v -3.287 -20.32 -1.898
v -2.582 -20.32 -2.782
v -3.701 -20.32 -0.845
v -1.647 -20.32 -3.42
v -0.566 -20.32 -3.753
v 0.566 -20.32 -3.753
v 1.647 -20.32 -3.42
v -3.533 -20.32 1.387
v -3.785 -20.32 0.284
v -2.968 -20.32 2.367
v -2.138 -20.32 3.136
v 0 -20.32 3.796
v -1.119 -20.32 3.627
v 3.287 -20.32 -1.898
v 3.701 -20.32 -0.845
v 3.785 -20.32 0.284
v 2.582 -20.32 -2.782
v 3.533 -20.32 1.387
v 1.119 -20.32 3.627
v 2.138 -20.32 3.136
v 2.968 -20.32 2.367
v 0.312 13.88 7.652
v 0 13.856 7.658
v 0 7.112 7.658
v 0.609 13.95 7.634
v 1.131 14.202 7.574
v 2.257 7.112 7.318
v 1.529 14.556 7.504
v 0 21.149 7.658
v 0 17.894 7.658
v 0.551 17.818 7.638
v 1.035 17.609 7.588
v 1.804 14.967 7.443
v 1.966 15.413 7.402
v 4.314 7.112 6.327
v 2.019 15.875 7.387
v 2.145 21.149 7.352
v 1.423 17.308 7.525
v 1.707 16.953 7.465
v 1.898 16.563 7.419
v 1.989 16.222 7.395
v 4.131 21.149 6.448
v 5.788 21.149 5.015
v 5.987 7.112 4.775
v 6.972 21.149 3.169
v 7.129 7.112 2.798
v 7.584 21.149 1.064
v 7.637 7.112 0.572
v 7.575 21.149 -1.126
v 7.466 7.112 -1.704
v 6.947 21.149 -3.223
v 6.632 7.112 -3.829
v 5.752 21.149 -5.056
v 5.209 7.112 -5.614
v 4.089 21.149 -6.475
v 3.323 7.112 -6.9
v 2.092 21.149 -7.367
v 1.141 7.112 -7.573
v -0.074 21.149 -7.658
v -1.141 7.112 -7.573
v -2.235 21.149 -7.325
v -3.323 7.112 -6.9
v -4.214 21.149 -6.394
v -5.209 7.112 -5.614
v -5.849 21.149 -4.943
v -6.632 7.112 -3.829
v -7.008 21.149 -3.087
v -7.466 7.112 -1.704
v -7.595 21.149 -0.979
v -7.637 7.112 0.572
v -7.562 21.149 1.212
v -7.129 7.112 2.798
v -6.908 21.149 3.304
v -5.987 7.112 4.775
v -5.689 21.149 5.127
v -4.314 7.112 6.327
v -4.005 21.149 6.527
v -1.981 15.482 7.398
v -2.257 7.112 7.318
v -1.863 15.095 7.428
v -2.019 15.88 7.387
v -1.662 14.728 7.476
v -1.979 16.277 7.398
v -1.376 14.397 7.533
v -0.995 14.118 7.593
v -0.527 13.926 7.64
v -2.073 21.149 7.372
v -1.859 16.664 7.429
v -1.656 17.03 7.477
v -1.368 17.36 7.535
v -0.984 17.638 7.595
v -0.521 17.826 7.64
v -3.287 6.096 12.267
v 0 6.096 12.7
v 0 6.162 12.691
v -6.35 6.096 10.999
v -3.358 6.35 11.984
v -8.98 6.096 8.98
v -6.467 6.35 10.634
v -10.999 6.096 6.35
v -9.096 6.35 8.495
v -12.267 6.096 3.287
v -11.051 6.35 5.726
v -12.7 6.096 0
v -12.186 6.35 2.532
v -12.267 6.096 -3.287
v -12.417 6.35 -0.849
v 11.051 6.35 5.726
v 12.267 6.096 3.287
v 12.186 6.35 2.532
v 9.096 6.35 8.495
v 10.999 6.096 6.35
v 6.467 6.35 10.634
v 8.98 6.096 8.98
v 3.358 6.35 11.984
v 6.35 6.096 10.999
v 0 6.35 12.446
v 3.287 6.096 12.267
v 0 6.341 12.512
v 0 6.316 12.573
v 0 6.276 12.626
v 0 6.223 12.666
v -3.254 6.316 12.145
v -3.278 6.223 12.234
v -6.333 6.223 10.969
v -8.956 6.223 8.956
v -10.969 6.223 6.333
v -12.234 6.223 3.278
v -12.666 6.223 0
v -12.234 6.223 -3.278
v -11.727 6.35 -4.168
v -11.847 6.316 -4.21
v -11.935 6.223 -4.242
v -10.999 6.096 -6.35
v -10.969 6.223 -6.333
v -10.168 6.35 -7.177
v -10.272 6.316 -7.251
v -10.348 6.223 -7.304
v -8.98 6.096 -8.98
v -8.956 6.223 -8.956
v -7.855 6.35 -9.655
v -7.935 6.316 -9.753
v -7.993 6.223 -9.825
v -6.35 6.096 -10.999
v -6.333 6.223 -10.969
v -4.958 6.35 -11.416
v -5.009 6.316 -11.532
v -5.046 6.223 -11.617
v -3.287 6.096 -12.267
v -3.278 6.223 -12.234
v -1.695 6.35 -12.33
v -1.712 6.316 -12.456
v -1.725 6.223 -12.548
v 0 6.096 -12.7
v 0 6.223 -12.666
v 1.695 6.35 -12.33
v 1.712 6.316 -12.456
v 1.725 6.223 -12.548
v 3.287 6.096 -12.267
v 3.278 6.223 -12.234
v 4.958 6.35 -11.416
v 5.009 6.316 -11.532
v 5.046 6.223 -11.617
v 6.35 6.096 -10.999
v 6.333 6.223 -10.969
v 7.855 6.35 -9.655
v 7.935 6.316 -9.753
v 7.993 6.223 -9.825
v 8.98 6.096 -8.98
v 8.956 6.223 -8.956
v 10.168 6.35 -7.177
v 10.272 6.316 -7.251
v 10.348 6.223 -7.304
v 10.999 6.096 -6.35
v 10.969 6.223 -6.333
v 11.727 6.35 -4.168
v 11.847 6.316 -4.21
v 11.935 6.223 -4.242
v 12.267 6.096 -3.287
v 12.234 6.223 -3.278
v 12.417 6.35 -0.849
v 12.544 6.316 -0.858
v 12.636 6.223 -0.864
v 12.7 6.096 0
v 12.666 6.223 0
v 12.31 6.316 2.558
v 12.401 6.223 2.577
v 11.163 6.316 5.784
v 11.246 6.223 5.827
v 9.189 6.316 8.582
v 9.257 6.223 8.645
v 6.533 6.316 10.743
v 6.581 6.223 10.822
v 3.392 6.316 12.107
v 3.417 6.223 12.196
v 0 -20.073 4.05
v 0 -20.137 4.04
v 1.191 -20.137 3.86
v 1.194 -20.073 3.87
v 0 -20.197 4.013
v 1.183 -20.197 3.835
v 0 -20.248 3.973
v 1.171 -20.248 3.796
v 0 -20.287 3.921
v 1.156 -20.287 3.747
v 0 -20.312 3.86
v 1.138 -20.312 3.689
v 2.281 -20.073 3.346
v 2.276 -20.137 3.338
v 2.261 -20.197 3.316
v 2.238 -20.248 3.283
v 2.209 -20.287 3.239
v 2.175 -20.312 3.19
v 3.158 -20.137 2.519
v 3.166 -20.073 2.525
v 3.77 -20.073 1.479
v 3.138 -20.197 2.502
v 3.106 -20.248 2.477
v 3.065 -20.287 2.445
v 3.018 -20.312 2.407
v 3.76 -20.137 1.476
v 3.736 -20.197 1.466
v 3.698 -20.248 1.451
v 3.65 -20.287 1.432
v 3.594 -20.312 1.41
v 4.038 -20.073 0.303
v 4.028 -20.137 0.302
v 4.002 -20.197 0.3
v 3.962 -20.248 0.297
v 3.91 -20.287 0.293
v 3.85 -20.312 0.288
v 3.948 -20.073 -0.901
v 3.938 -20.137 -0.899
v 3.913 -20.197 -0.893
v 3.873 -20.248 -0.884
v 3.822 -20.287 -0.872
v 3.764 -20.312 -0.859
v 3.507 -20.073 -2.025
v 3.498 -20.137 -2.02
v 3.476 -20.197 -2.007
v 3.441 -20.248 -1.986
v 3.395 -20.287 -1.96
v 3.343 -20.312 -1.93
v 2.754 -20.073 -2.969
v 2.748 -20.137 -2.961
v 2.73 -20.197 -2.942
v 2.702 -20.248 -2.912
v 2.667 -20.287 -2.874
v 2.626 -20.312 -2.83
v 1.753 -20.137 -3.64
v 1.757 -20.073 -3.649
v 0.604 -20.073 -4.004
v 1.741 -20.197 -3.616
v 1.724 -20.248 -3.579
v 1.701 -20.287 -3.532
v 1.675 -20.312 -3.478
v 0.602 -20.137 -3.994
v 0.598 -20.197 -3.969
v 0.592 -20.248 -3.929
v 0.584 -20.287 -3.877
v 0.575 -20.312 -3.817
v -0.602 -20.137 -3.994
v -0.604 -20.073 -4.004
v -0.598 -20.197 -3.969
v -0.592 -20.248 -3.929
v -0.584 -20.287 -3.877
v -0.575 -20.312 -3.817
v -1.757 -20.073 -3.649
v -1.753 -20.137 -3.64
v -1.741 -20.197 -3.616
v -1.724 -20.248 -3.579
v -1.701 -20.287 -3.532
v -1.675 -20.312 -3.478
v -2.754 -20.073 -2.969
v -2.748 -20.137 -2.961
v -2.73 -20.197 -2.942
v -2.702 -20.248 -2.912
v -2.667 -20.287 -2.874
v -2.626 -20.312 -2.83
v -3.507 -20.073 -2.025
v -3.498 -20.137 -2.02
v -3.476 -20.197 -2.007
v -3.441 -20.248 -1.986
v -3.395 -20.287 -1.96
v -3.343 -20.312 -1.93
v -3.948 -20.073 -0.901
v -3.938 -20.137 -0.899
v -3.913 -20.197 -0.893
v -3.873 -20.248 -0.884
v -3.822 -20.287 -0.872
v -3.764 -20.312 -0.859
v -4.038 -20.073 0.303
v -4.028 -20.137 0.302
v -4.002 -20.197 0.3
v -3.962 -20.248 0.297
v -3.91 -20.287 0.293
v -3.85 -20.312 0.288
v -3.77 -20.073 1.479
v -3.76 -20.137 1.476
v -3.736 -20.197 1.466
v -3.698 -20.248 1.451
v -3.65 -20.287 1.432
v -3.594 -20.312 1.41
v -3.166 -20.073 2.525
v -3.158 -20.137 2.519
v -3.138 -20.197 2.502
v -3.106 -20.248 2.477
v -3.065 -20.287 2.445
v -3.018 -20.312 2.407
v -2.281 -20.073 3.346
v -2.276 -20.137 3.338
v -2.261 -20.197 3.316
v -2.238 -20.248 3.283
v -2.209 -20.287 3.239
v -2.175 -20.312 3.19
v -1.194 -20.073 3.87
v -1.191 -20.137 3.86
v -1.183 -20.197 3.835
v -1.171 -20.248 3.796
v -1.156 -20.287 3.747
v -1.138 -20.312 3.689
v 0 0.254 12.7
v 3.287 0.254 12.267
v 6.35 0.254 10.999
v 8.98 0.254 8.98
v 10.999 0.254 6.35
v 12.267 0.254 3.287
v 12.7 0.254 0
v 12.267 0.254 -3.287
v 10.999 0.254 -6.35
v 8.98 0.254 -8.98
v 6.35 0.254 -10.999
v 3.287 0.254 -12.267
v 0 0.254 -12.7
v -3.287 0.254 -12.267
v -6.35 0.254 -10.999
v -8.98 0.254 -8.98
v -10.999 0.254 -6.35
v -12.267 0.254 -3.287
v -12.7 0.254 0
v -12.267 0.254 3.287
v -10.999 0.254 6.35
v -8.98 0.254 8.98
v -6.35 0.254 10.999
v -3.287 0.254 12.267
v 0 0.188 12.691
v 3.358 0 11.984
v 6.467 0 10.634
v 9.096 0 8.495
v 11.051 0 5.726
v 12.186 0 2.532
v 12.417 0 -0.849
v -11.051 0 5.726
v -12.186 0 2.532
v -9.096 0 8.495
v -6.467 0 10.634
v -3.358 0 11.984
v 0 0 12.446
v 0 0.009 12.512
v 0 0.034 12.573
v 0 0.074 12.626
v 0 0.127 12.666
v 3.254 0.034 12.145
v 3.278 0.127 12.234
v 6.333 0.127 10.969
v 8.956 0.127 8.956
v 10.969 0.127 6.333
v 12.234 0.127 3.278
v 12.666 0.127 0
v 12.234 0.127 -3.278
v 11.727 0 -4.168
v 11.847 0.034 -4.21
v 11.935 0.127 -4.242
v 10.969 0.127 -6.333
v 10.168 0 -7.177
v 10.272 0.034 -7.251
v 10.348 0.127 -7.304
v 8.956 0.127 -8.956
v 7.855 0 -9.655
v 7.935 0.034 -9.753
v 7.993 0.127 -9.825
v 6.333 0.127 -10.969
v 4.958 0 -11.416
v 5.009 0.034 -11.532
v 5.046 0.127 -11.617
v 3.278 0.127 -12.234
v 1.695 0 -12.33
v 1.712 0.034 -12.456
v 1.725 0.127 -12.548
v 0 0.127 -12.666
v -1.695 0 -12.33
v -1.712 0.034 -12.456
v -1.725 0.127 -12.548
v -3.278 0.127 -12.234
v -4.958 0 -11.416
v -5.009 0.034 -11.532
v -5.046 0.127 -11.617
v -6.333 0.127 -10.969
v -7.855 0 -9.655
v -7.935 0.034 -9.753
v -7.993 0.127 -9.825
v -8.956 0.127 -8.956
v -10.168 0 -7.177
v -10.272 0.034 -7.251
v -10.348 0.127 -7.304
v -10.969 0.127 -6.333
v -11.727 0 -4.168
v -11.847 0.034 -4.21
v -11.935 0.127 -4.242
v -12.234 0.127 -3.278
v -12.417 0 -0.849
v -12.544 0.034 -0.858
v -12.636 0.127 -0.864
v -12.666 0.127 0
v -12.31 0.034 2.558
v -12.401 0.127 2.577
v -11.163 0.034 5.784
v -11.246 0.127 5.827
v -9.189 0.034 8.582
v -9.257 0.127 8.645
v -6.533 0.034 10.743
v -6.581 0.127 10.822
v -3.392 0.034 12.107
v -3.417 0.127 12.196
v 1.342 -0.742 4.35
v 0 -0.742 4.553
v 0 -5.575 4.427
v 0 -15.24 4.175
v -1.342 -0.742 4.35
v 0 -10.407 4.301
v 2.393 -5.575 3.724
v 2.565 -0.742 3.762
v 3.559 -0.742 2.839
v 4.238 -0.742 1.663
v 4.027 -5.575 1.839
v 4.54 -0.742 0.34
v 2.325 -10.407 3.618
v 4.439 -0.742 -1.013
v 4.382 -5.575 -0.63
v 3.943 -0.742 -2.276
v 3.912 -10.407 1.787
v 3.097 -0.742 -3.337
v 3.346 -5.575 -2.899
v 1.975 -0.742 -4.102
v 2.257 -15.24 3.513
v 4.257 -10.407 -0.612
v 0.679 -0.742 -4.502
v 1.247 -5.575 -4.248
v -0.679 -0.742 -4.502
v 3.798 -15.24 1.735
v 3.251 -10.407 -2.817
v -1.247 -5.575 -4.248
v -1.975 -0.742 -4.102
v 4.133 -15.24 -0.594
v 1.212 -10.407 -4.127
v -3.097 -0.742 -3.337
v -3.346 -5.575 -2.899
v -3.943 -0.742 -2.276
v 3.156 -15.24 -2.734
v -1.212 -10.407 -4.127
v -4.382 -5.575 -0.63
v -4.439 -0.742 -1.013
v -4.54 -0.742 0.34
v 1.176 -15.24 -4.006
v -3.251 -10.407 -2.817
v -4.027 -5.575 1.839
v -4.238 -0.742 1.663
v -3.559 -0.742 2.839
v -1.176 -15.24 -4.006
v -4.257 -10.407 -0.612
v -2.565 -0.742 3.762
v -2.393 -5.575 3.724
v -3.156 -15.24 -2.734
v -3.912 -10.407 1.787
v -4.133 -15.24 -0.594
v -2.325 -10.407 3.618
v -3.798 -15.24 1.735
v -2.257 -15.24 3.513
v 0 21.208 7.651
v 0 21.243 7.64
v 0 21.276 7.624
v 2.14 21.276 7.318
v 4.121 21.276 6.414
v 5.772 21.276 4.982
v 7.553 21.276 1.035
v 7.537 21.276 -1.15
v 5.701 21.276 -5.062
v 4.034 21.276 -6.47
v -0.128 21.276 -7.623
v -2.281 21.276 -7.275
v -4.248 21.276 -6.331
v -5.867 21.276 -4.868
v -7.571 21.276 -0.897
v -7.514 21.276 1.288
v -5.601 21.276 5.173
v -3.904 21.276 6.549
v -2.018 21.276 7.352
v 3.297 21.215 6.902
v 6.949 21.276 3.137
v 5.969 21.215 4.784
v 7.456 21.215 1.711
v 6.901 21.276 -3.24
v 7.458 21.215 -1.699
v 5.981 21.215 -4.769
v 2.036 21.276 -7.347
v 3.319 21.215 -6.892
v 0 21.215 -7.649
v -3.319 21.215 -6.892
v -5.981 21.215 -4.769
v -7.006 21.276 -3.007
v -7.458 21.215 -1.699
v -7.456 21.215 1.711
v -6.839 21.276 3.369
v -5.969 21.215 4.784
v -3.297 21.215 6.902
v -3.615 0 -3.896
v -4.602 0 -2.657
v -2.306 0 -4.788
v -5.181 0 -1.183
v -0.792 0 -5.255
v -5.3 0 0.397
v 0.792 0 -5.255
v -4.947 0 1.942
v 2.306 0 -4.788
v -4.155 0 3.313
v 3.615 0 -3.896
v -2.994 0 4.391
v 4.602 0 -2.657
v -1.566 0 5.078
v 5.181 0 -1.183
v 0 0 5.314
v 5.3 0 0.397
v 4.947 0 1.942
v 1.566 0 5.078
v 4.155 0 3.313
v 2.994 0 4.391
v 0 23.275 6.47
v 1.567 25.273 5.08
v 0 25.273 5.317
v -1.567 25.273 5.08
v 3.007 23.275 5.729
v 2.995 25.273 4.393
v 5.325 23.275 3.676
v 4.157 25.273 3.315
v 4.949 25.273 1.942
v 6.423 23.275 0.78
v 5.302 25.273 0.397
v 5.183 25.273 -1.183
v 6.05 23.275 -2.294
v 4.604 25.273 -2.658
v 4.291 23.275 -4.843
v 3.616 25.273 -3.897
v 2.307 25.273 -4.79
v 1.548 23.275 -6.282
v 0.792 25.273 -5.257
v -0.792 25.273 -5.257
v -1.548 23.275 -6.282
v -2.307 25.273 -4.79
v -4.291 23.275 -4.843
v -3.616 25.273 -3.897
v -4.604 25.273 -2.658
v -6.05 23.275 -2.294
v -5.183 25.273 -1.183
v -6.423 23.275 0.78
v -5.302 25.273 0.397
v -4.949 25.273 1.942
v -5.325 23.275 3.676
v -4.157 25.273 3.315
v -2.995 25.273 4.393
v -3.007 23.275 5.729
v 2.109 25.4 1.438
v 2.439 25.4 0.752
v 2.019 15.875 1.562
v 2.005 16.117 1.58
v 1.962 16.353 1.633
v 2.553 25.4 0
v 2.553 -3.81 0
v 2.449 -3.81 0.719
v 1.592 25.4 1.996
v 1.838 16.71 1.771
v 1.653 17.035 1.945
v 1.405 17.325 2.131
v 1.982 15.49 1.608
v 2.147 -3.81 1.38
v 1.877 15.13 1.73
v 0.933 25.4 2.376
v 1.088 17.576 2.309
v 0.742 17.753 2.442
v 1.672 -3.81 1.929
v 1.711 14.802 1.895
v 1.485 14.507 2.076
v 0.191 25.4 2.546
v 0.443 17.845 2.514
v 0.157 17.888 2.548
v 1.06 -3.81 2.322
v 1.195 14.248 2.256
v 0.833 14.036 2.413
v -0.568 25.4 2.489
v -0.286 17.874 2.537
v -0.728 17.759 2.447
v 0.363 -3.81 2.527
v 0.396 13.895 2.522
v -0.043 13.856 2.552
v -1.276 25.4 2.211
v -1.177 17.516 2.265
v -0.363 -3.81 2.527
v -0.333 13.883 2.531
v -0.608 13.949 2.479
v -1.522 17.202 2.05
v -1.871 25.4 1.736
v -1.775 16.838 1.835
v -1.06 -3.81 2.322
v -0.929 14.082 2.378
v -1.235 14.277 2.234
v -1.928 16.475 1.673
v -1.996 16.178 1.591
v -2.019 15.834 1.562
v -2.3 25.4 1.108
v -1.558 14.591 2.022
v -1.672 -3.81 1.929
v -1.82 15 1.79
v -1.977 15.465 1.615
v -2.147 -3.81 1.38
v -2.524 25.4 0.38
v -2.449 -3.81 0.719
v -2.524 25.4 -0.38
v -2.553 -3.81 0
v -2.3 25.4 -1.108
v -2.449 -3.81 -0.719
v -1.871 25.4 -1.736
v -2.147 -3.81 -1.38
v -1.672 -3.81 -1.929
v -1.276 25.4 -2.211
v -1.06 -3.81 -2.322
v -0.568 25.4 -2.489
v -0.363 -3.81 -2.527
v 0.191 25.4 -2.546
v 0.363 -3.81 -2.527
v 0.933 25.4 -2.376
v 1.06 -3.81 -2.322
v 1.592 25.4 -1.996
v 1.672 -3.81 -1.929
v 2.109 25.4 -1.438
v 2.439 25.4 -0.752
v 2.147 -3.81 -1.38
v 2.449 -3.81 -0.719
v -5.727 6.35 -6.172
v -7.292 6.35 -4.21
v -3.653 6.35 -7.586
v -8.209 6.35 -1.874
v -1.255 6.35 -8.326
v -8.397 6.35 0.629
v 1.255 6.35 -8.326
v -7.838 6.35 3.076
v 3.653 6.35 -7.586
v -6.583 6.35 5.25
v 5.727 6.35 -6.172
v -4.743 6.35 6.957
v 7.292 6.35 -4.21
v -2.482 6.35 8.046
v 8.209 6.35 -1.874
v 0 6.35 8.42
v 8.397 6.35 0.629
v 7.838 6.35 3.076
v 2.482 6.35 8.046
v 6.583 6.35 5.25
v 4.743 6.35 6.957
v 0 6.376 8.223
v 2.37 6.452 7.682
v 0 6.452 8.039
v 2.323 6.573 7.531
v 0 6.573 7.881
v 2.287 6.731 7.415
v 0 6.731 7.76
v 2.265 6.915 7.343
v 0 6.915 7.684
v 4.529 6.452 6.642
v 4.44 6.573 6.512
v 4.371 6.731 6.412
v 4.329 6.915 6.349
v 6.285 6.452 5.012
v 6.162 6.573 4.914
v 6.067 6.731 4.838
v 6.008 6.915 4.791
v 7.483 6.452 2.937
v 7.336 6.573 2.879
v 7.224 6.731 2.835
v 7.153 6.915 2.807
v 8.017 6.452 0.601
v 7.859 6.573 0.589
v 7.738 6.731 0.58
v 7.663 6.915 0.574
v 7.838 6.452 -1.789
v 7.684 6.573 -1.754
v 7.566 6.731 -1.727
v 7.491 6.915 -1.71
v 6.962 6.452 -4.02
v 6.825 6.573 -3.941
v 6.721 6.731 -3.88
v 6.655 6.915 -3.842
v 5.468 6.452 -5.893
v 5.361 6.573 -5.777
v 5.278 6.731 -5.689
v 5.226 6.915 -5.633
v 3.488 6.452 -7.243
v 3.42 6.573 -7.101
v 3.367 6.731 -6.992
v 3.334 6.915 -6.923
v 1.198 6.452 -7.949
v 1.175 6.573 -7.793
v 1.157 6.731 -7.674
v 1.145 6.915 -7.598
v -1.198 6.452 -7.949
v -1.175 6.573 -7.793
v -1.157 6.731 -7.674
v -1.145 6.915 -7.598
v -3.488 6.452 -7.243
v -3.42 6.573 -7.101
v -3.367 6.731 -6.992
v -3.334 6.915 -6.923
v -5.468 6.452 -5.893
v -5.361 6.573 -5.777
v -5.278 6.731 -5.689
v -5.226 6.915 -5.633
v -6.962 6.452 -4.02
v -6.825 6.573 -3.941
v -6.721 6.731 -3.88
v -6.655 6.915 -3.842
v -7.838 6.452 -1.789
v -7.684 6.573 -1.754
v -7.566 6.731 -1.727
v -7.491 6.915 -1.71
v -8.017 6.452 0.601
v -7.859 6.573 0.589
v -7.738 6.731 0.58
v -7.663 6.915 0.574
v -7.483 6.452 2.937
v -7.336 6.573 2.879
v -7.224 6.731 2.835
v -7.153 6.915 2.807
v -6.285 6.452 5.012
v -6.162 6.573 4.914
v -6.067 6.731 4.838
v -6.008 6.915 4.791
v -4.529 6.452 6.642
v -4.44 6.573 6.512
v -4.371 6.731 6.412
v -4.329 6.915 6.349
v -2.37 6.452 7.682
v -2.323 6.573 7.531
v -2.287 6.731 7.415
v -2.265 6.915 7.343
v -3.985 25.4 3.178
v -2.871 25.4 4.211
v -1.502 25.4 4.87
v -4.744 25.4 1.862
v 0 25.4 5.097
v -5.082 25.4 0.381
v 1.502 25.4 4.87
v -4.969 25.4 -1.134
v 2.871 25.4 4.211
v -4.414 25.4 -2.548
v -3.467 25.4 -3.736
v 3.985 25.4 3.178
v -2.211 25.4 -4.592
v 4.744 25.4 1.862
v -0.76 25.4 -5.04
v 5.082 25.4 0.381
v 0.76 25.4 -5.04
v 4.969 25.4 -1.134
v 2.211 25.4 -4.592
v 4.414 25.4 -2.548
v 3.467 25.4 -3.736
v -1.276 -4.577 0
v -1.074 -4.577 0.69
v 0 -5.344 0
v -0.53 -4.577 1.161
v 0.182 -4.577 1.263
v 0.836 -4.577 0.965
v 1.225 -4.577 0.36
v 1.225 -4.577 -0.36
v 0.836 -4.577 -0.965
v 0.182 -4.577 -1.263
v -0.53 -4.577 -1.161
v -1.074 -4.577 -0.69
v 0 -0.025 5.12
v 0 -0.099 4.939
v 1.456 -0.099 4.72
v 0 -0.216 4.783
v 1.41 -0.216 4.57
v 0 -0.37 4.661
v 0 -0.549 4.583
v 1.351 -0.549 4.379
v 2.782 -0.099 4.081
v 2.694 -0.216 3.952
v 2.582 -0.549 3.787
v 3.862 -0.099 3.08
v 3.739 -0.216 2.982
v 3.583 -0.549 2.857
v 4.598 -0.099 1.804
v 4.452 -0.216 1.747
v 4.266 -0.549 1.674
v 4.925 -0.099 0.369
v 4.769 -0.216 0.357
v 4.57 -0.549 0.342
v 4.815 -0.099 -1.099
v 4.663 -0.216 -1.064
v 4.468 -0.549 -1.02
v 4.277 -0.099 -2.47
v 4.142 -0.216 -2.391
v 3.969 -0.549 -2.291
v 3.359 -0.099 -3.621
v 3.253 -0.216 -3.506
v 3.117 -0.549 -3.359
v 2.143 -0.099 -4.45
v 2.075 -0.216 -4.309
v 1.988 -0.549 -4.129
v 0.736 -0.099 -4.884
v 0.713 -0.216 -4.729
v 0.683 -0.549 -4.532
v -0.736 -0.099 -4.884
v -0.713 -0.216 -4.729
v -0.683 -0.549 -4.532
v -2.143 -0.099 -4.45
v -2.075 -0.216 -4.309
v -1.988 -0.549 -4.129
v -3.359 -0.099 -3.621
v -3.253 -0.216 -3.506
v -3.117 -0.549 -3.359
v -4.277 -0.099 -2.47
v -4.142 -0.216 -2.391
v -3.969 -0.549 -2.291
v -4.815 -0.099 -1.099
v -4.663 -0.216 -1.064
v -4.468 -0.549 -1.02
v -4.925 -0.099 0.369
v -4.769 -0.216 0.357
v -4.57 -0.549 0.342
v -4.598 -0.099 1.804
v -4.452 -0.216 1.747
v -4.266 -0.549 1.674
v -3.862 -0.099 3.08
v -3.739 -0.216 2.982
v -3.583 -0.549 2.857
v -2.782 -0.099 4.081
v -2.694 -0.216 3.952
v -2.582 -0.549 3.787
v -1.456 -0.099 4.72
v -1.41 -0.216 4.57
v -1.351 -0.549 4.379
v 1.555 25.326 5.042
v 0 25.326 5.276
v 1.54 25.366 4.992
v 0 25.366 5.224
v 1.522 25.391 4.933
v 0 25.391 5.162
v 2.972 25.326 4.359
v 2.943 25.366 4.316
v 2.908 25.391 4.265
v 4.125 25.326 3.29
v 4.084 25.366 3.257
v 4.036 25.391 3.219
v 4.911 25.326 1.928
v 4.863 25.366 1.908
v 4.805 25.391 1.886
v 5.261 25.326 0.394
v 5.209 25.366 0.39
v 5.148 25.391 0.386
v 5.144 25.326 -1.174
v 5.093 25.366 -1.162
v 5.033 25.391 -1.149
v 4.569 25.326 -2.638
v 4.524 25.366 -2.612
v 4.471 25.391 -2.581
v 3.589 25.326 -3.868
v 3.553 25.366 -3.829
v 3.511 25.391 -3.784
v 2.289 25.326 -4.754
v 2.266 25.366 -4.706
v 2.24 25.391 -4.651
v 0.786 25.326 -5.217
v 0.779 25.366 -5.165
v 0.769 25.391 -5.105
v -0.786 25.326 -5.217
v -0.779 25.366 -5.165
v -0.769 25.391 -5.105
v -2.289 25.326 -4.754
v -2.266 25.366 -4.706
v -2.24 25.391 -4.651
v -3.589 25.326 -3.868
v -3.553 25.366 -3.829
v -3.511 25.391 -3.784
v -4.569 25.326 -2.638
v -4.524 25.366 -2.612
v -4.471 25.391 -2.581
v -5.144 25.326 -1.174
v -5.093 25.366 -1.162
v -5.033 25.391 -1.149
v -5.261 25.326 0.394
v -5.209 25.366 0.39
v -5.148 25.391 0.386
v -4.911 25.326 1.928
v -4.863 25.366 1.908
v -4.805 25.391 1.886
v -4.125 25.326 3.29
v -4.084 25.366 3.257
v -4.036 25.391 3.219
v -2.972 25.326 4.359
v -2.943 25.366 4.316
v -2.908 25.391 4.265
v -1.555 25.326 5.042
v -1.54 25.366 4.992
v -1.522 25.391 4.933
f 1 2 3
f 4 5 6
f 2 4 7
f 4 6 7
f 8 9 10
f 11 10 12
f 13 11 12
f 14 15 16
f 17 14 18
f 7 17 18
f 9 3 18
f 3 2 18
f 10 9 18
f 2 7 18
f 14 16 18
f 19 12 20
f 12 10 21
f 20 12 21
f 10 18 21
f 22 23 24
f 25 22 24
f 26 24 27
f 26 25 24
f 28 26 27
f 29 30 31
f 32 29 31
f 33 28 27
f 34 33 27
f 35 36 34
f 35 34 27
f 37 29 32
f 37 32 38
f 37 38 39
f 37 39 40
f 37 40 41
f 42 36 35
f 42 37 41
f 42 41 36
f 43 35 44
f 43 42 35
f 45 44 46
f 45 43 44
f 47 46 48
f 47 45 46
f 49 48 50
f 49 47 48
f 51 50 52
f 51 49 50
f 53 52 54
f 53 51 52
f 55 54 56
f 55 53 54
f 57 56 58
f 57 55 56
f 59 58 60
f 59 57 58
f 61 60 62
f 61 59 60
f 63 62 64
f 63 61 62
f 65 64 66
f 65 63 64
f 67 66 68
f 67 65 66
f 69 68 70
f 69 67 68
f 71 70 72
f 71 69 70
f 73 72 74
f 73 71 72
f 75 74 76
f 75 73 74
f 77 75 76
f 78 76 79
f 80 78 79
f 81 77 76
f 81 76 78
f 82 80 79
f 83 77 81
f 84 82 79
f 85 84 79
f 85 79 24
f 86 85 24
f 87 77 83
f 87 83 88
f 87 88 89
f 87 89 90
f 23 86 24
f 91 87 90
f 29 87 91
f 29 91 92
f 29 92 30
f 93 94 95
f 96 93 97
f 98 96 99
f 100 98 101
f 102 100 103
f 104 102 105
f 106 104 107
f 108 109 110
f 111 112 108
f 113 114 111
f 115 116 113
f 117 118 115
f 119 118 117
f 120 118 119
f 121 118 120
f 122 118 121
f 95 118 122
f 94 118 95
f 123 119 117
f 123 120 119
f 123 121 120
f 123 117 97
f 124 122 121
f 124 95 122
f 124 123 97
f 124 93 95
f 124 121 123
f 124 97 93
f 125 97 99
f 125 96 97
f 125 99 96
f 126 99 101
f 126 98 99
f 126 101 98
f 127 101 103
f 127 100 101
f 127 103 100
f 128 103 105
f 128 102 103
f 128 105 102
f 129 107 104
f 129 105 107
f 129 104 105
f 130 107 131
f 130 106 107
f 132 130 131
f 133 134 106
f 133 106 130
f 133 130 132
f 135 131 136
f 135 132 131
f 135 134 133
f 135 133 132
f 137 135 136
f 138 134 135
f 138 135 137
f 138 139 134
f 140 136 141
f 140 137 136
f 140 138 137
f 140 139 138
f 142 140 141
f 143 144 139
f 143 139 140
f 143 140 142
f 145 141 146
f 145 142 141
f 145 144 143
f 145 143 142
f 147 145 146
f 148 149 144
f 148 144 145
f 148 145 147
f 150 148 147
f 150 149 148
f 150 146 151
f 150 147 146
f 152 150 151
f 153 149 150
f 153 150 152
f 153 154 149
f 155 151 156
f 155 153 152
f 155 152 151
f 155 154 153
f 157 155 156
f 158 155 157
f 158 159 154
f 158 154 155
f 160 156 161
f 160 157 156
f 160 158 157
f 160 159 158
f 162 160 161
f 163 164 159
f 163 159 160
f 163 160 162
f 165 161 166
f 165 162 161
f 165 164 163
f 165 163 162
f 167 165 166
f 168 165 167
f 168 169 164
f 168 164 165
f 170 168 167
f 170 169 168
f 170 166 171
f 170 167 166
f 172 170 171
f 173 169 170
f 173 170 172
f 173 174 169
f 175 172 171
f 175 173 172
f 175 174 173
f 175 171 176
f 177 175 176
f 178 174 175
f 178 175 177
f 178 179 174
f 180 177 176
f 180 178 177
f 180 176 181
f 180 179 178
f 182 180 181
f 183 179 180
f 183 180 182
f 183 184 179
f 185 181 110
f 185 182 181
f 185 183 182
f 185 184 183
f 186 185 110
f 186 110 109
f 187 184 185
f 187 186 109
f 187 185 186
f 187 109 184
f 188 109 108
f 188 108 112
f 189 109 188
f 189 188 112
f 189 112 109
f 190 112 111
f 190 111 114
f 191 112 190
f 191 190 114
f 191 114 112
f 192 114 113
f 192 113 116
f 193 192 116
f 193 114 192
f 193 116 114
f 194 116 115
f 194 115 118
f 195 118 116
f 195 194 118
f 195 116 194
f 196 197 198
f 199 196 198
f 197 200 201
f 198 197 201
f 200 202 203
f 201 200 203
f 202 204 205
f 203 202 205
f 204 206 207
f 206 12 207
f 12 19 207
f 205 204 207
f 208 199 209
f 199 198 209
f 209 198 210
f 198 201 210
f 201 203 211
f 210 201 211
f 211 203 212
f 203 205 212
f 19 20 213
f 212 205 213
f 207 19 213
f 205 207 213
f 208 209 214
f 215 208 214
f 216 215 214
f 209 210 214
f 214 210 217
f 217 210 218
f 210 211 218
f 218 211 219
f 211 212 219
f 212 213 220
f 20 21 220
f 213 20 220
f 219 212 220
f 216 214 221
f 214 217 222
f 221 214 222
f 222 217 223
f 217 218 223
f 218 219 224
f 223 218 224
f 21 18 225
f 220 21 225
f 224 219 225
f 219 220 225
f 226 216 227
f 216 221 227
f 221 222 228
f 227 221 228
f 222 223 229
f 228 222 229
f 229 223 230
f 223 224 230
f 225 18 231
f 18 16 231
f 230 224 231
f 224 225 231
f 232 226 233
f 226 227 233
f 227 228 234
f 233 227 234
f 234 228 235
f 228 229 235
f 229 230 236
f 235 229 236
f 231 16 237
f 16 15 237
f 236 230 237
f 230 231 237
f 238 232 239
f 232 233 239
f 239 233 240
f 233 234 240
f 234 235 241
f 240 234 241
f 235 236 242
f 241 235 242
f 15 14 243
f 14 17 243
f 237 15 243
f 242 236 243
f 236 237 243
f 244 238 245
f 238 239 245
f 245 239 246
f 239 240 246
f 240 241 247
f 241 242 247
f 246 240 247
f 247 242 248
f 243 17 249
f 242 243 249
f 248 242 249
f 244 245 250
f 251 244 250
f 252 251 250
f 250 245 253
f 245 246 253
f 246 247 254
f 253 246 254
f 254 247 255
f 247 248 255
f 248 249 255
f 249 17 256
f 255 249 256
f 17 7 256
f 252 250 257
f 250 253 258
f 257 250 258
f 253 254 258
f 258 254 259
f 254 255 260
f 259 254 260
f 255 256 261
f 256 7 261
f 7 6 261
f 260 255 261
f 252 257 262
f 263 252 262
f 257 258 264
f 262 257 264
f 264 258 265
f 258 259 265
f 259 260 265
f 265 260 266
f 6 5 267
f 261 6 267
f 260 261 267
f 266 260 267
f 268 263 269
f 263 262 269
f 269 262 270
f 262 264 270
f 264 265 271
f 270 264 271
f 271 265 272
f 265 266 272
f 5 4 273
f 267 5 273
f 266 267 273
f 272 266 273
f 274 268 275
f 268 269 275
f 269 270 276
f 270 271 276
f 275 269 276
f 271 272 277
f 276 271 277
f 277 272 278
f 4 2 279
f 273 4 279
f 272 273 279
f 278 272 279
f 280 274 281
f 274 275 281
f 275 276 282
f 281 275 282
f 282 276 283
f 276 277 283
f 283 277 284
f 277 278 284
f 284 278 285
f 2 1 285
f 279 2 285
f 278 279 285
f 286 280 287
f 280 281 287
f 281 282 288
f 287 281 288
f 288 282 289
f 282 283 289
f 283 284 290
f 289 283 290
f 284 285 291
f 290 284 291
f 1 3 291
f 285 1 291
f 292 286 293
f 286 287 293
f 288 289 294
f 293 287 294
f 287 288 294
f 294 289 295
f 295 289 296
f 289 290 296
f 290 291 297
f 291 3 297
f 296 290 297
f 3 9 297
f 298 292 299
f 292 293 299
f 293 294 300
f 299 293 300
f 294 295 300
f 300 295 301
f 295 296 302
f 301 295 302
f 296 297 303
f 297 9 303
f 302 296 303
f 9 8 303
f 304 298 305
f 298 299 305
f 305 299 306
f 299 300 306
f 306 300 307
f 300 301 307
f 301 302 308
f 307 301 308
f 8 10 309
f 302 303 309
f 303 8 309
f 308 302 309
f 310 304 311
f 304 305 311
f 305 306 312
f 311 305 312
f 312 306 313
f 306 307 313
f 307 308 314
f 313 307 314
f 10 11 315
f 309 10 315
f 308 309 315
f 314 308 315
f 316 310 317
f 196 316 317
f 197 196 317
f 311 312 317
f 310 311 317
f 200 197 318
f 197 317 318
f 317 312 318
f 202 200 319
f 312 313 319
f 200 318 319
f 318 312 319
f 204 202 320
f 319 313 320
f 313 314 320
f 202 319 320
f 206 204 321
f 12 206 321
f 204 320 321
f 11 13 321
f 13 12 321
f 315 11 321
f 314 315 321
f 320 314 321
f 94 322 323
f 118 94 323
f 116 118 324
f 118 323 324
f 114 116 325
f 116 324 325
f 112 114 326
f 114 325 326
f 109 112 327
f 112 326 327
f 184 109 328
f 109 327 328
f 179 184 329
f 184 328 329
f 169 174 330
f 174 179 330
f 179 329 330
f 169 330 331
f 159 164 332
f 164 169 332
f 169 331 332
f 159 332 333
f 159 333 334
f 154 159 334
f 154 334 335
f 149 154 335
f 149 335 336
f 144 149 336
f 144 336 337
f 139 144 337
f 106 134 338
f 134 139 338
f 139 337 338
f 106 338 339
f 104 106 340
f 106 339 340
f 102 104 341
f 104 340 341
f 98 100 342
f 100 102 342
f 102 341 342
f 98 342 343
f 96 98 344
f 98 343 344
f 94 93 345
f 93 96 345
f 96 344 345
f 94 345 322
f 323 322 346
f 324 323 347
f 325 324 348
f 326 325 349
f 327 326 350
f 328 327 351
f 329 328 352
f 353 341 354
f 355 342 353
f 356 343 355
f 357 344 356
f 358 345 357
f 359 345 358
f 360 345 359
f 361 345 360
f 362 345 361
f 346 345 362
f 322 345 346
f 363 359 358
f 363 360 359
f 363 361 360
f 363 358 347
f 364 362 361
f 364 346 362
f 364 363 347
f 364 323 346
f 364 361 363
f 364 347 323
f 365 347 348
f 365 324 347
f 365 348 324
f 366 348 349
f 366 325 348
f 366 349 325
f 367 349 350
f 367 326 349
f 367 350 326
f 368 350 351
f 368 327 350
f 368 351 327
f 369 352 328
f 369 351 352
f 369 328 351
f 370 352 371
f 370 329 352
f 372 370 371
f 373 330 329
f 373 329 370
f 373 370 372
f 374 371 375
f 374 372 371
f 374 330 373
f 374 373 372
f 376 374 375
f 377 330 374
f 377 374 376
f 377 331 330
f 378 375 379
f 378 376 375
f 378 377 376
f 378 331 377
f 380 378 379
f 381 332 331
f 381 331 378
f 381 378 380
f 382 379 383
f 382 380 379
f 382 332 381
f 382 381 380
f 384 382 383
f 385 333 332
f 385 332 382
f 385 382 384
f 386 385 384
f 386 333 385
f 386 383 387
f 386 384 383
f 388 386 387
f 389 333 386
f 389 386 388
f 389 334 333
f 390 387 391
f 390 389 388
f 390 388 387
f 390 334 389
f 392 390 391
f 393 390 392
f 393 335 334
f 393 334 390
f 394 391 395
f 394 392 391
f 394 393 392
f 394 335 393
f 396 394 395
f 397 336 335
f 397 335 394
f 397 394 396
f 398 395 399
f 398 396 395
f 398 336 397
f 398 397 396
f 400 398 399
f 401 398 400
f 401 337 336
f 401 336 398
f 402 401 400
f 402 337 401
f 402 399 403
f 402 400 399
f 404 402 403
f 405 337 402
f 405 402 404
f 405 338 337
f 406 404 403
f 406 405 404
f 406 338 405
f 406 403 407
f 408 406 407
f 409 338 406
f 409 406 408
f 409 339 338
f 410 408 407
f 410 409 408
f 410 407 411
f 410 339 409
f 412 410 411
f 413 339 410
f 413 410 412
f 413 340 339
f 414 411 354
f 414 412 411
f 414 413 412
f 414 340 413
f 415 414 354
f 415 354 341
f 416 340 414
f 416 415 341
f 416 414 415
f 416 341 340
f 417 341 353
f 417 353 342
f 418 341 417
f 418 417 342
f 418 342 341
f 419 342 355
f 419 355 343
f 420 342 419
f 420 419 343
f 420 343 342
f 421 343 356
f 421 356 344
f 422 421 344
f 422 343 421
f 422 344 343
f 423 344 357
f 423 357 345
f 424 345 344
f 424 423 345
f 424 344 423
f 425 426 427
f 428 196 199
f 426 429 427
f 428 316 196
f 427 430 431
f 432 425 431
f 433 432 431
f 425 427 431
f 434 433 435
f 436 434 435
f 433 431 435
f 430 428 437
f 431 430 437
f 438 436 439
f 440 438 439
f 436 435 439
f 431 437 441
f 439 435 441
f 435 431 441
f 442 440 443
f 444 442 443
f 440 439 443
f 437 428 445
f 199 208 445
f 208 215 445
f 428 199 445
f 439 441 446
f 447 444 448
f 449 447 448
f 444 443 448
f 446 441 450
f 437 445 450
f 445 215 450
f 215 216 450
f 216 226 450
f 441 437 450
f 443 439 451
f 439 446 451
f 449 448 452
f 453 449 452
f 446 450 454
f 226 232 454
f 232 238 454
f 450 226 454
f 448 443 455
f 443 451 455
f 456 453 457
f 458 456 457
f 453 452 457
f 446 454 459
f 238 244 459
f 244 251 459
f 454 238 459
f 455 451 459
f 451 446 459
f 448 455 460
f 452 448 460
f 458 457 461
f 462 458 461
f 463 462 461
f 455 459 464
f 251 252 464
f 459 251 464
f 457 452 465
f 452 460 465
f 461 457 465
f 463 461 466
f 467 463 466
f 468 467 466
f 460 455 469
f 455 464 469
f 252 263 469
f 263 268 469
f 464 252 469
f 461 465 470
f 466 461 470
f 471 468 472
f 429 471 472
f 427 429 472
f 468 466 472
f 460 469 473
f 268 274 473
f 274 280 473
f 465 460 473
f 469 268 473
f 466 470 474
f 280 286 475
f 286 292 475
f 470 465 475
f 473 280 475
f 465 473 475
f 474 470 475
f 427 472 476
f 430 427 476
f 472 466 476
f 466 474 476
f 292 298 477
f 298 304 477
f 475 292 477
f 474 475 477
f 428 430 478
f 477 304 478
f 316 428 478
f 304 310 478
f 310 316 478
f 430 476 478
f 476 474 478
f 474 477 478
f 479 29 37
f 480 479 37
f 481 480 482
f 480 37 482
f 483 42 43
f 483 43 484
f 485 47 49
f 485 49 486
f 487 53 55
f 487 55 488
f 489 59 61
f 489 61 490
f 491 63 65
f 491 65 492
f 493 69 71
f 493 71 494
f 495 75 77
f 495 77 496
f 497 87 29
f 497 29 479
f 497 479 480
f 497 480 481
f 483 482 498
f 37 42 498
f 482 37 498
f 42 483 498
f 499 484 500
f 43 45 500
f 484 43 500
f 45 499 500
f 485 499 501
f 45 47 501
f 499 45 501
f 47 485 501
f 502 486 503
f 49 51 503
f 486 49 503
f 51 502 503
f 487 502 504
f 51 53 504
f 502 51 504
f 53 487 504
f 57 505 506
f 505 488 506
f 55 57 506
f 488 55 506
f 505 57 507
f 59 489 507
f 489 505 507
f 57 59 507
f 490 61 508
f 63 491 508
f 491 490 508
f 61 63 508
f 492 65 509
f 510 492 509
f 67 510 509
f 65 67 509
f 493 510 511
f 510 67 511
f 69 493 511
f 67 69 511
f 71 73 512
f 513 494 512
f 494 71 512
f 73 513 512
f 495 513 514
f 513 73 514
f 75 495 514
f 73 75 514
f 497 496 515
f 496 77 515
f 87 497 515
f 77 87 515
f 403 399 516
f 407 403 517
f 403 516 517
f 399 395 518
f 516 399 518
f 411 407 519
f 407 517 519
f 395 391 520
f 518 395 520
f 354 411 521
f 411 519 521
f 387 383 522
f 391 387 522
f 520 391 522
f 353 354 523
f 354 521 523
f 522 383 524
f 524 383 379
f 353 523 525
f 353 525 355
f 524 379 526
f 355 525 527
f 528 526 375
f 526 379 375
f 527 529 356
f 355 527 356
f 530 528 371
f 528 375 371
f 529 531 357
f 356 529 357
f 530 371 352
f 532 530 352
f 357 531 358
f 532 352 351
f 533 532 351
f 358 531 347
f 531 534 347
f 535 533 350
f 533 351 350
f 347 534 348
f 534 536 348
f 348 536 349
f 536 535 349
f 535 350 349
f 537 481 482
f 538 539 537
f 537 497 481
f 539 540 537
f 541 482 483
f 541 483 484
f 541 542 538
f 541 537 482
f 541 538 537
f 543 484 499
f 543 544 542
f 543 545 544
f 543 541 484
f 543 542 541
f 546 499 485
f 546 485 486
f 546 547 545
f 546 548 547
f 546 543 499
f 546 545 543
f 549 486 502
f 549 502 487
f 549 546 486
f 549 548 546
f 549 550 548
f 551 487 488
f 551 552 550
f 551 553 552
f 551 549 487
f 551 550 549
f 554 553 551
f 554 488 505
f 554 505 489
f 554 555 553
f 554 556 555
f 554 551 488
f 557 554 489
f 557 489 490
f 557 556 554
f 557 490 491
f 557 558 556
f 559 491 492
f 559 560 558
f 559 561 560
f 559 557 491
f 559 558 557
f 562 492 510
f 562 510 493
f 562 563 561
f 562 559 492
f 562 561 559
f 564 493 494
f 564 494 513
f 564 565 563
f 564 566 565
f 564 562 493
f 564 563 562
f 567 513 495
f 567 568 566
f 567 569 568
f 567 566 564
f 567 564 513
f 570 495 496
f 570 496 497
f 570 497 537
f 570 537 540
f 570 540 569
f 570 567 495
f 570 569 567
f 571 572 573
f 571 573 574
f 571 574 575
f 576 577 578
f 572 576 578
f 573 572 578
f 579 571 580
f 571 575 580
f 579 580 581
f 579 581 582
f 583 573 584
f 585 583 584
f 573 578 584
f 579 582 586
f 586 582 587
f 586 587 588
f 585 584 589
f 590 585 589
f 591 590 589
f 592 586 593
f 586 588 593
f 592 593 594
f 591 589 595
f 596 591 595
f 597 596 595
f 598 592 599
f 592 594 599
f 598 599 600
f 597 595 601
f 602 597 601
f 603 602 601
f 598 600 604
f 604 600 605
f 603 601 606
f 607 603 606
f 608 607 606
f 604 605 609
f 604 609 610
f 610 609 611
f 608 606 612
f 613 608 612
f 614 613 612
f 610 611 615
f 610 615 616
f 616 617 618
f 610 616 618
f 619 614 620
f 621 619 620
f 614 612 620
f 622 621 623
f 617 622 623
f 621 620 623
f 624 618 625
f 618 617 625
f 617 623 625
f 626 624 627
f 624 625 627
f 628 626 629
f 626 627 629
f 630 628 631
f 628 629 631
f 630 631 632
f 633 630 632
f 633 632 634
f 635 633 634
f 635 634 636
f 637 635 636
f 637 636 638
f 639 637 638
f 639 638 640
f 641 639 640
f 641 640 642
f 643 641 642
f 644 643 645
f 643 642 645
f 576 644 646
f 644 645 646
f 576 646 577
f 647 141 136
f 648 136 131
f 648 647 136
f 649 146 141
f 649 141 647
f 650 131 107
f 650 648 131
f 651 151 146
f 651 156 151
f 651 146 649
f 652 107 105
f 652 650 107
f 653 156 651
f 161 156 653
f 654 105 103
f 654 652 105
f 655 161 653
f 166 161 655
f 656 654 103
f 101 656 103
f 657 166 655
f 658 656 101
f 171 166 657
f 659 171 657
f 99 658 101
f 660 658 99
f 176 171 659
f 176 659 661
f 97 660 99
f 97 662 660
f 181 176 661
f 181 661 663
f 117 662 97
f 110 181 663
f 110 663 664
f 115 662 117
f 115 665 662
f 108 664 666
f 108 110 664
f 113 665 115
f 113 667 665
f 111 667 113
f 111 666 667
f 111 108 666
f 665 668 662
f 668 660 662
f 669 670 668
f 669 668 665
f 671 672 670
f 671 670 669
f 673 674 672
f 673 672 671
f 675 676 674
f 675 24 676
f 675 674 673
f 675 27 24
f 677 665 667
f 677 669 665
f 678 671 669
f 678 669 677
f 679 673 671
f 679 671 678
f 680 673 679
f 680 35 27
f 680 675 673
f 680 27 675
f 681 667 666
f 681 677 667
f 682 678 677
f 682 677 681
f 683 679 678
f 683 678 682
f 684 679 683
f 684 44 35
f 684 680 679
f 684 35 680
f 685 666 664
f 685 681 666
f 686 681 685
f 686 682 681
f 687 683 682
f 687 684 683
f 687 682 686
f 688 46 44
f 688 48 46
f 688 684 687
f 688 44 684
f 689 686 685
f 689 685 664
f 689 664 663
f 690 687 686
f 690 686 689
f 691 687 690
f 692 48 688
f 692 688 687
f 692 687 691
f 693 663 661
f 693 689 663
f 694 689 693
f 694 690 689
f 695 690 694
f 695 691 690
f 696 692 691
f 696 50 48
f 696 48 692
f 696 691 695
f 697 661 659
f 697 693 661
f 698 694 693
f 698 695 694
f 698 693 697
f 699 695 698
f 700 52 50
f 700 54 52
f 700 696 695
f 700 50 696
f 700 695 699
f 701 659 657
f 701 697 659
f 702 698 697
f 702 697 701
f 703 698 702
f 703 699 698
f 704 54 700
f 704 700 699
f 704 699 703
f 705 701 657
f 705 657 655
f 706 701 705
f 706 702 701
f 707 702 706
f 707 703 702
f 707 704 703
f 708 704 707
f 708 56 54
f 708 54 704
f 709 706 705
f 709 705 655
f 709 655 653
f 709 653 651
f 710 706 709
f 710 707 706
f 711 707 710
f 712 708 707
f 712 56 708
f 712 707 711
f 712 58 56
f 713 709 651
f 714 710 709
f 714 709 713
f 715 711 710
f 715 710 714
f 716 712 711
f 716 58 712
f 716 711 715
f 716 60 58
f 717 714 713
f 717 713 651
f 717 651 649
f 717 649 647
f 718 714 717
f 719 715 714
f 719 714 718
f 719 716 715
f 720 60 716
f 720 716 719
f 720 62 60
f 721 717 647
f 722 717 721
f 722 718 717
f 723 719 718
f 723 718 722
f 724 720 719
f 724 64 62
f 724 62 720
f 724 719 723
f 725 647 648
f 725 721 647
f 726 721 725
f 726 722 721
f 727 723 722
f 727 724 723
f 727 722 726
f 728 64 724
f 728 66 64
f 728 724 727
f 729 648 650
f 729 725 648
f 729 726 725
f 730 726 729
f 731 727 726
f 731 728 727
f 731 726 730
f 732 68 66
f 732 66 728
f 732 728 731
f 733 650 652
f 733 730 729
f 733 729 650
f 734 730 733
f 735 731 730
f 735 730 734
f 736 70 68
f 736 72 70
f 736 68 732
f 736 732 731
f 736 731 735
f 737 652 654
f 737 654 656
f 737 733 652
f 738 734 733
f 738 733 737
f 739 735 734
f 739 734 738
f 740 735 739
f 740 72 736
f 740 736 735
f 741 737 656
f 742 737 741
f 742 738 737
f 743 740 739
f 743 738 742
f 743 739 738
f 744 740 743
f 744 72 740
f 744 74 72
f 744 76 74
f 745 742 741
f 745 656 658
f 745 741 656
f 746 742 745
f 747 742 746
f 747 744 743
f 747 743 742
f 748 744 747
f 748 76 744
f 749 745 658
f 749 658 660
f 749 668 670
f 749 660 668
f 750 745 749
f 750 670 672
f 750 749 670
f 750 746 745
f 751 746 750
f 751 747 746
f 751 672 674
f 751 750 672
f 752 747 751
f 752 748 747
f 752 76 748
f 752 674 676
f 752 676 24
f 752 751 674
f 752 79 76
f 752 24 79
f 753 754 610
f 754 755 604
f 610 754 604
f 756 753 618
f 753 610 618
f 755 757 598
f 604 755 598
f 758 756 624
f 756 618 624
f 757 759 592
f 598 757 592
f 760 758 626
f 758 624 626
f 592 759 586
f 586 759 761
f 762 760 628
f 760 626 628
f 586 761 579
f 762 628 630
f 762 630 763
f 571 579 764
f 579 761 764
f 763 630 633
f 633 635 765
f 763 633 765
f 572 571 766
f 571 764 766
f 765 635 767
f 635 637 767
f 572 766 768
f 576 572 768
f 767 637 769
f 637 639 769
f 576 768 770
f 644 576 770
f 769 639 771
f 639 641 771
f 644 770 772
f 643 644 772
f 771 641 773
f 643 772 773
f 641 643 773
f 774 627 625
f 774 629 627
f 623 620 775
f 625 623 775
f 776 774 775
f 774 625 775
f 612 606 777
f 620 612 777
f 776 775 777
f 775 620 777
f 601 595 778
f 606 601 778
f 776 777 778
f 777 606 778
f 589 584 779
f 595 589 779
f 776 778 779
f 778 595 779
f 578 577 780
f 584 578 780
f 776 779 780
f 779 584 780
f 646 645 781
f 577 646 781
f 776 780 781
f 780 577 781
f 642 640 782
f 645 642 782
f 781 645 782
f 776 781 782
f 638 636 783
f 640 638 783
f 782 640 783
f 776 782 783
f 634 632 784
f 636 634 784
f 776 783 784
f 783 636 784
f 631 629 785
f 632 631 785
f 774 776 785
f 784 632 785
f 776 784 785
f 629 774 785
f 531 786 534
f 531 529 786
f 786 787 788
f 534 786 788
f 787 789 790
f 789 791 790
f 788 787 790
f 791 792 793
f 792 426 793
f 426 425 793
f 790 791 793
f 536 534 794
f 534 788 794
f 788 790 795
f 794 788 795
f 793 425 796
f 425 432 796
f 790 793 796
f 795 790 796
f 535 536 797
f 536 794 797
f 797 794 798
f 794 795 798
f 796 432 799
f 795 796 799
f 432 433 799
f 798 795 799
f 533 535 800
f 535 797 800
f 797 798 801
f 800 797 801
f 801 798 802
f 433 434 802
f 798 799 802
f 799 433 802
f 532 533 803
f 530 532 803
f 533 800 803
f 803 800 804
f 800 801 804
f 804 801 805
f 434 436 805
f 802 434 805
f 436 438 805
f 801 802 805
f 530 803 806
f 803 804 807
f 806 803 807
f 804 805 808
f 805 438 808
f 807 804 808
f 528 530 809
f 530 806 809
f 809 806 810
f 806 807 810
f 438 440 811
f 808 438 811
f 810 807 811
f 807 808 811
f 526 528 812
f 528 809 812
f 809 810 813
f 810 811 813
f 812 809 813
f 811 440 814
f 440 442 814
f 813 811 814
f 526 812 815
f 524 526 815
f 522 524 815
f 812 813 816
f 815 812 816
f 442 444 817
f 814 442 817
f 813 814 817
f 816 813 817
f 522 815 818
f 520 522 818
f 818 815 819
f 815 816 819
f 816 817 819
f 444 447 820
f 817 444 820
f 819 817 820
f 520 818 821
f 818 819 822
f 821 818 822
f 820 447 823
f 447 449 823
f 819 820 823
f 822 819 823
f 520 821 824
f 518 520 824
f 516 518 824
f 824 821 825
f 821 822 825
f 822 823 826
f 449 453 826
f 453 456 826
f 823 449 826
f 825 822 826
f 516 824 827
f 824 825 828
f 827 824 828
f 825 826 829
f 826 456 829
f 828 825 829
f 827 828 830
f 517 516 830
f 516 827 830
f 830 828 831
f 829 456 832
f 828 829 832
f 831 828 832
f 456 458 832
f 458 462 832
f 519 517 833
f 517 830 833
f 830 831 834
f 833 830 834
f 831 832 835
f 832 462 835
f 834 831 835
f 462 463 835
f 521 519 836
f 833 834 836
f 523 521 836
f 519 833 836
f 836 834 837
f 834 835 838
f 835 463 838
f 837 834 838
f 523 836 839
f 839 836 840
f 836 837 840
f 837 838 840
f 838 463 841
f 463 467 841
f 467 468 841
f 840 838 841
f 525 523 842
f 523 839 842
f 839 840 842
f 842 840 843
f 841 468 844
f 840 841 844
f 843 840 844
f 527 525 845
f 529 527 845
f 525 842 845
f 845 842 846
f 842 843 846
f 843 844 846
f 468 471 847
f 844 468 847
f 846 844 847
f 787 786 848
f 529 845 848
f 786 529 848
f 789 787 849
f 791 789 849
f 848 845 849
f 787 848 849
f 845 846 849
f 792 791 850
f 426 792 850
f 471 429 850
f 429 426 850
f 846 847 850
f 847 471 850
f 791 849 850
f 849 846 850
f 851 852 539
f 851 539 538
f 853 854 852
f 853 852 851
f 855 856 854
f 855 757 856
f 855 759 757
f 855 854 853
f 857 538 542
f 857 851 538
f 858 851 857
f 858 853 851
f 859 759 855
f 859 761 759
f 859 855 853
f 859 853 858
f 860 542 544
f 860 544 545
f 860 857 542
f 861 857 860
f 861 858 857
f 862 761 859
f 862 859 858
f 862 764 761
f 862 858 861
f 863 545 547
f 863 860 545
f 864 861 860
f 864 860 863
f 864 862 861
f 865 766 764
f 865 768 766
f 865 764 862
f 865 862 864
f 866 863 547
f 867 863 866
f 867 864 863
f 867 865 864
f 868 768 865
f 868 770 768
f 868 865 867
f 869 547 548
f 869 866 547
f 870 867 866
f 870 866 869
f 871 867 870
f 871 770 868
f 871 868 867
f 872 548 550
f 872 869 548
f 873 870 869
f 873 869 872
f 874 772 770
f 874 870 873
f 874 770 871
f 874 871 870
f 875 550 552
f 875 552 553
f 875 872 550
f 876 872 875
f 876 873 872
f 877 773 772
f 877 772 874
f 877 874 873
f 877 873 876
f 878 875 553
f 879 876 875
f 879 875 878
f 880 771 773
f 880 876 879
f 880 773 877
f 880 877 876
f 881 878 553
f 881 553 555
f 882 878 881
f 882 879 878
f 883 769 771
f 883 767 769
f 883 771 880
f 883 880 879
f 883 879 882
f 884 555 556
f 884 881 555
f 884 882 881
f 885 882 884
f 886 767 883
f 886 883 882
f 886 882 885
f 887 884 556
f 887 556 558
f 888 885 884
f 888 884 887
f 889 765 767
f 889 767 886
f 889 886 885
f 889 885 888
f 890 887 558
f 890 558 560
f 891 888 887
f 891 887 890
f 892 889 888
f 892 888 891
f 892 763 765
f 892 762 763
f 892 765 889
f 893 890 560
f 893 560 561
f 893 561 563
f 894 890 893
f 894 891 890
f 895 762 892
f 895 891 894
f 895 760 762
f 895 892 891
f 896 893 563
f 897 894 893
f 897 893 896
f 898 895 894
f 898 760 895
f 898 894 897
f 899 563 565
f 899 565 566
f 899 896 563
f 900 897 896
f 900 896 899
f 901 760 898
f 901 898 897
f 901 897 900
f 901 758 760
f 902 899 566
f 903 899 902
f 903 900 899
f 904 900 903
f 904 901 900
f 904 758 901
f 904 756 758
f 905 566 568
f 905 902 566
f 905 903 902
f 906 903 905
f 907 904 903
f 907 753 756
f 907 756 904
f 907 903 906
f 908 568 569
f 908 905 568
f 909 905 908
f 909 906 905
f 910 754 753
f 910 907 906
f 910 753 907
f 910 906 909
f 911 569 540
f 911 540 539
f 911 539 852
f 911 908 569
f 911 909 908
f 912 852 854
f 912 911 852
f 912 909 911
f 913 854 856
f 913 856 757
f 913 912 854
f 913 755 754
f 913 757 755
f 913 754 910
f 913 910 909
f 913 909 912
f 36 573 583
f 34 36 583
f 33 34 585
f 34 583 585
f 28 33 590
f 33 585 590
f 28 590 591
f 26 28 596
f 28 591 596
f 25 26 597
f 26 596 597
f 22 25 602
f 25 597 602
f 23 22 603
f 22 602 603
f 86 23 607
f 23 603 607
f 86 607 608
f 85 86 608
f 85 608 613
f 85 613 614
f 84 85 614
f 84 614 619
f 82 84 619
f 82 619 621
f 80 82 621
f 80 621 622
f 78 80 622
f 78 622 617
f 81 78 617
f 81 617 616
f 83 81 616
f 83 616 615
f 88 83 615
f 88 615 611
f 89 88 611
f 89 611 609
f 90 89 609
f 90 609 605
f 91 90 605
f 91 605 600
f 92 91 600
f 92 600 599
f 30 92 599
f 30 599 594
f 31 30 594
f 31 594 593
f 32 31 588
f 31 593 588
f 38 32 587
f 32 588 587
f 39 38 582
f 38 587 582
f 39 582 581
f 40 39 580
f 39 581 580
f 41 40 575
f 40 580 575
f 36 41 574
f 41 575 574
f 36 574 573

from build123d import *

# Parameters (mm, degrees)
F2_R      = 0.762
F3_R      = 0.254
F6_R      = 0.762
F7_R      = 0.254
F9_D      = 5.1054
F9_DEPTH  = 29.21
F9_TIP    = 1.5338169022
F11_D     = 4.0386
F11_DEPTH = 20.79625
F11_TIP   = 1.213317848


with BuildPart() as f1:
    # F0 (on Right) → F1 (revolve)
    with BuildSketch(Plane.YZ):
        Polygon((-20.32, 0), (25.4, 0), (25.4, 12.7), (0, 12.7), (0, 4.572), (-20.32, 4.0431670856), align=None)
    revolve(axis=Axis((0, 2.54, 0), (0, 1, 0)))

    # F2
    f2_edges = [f1.edges().sort_by_distance(p)[0] for p in [
        (0, 0, -4.572),
    ]]
    fillet(f2_edges, radius=F2_R)

    # F3
    f3_edges = [f1.edges().sort_by_distance(p)[0] for p in [
        (0, 0, -12.7),
        (0, 25.4, -12.7),
        (0, -20.32, -4.043167),
    ]]
    fillet(f3_edges, radius=F3_R)

    # F4 (on Right) → F5 (revolve, cut)
    with BuildSketch(Plane.YZ):
        Polygon((25.4, 19.05), (6.35, 19.05), (6.35, 7.6581), (21.2173533836, 7.6581), (25.4, 5.2432478501), align=None)
    revolve(axis=Axis((0, 4.037976265, 0), (0, 1, 0)), mode=Mode.SUBTRACT)

    # F6
    f6_edges = [f1.edges().sort_by_distance(p)[0] for p in [
        (0, 6.35, -7.6581),
    ]]
    fillet(f6_edges, radius=F6_R)

    # F7
    f7_edges = [f1.edges().sort_by_distance(p)[0] for p in [
        (0, 6.35, -12.7),
        (0, 21.217353, -7.6581),
        (0, 25.4, -5.243248),
    ]]
    fillet(f7_edges, radius=F7_R)

    # F9
    with Locations(Plane(origin=(0, 25.4, 0), x_dir=(-1, 0, 0), z_dir=(0, 1, 0))):
        with Locations((0, 0)):
            Hole(F9_D / 2, depth=F9_DEPTH)
            with Locations((0, 0, -(F9_DEPTH + F9_TIP / 2))):  # 118° drill point
                Cone(0, F9_D / 2, F9_TIP, mode=Mode.SUBTRACT)

    # F11 (one way)
    with BuildSketch(Plane(origin=(0, 0, 0), x_dir=(1, 0, 0), z_dir=(0, 0, -1))):
        with Locations((0, -15.875)):
            Circle(F11_D / 2)
    extrude(amount=-F11_DEPTH, mode=Mode.SUBTRACT)
    with Locations(Plane(origin=(0, 0, 0), x_dir=(1, 0, 0), z_dir=(0, 0, -1))):
        with Locations((0, -15.875)):
            with Locations((0, 0, -(F11_DEPTH + F11_TIP / 2))):  # 118° drill point
                Cone(0, F11_D / 2, F11_TIP, mode=Mode.SUBTRACT)


solid = f1.part
